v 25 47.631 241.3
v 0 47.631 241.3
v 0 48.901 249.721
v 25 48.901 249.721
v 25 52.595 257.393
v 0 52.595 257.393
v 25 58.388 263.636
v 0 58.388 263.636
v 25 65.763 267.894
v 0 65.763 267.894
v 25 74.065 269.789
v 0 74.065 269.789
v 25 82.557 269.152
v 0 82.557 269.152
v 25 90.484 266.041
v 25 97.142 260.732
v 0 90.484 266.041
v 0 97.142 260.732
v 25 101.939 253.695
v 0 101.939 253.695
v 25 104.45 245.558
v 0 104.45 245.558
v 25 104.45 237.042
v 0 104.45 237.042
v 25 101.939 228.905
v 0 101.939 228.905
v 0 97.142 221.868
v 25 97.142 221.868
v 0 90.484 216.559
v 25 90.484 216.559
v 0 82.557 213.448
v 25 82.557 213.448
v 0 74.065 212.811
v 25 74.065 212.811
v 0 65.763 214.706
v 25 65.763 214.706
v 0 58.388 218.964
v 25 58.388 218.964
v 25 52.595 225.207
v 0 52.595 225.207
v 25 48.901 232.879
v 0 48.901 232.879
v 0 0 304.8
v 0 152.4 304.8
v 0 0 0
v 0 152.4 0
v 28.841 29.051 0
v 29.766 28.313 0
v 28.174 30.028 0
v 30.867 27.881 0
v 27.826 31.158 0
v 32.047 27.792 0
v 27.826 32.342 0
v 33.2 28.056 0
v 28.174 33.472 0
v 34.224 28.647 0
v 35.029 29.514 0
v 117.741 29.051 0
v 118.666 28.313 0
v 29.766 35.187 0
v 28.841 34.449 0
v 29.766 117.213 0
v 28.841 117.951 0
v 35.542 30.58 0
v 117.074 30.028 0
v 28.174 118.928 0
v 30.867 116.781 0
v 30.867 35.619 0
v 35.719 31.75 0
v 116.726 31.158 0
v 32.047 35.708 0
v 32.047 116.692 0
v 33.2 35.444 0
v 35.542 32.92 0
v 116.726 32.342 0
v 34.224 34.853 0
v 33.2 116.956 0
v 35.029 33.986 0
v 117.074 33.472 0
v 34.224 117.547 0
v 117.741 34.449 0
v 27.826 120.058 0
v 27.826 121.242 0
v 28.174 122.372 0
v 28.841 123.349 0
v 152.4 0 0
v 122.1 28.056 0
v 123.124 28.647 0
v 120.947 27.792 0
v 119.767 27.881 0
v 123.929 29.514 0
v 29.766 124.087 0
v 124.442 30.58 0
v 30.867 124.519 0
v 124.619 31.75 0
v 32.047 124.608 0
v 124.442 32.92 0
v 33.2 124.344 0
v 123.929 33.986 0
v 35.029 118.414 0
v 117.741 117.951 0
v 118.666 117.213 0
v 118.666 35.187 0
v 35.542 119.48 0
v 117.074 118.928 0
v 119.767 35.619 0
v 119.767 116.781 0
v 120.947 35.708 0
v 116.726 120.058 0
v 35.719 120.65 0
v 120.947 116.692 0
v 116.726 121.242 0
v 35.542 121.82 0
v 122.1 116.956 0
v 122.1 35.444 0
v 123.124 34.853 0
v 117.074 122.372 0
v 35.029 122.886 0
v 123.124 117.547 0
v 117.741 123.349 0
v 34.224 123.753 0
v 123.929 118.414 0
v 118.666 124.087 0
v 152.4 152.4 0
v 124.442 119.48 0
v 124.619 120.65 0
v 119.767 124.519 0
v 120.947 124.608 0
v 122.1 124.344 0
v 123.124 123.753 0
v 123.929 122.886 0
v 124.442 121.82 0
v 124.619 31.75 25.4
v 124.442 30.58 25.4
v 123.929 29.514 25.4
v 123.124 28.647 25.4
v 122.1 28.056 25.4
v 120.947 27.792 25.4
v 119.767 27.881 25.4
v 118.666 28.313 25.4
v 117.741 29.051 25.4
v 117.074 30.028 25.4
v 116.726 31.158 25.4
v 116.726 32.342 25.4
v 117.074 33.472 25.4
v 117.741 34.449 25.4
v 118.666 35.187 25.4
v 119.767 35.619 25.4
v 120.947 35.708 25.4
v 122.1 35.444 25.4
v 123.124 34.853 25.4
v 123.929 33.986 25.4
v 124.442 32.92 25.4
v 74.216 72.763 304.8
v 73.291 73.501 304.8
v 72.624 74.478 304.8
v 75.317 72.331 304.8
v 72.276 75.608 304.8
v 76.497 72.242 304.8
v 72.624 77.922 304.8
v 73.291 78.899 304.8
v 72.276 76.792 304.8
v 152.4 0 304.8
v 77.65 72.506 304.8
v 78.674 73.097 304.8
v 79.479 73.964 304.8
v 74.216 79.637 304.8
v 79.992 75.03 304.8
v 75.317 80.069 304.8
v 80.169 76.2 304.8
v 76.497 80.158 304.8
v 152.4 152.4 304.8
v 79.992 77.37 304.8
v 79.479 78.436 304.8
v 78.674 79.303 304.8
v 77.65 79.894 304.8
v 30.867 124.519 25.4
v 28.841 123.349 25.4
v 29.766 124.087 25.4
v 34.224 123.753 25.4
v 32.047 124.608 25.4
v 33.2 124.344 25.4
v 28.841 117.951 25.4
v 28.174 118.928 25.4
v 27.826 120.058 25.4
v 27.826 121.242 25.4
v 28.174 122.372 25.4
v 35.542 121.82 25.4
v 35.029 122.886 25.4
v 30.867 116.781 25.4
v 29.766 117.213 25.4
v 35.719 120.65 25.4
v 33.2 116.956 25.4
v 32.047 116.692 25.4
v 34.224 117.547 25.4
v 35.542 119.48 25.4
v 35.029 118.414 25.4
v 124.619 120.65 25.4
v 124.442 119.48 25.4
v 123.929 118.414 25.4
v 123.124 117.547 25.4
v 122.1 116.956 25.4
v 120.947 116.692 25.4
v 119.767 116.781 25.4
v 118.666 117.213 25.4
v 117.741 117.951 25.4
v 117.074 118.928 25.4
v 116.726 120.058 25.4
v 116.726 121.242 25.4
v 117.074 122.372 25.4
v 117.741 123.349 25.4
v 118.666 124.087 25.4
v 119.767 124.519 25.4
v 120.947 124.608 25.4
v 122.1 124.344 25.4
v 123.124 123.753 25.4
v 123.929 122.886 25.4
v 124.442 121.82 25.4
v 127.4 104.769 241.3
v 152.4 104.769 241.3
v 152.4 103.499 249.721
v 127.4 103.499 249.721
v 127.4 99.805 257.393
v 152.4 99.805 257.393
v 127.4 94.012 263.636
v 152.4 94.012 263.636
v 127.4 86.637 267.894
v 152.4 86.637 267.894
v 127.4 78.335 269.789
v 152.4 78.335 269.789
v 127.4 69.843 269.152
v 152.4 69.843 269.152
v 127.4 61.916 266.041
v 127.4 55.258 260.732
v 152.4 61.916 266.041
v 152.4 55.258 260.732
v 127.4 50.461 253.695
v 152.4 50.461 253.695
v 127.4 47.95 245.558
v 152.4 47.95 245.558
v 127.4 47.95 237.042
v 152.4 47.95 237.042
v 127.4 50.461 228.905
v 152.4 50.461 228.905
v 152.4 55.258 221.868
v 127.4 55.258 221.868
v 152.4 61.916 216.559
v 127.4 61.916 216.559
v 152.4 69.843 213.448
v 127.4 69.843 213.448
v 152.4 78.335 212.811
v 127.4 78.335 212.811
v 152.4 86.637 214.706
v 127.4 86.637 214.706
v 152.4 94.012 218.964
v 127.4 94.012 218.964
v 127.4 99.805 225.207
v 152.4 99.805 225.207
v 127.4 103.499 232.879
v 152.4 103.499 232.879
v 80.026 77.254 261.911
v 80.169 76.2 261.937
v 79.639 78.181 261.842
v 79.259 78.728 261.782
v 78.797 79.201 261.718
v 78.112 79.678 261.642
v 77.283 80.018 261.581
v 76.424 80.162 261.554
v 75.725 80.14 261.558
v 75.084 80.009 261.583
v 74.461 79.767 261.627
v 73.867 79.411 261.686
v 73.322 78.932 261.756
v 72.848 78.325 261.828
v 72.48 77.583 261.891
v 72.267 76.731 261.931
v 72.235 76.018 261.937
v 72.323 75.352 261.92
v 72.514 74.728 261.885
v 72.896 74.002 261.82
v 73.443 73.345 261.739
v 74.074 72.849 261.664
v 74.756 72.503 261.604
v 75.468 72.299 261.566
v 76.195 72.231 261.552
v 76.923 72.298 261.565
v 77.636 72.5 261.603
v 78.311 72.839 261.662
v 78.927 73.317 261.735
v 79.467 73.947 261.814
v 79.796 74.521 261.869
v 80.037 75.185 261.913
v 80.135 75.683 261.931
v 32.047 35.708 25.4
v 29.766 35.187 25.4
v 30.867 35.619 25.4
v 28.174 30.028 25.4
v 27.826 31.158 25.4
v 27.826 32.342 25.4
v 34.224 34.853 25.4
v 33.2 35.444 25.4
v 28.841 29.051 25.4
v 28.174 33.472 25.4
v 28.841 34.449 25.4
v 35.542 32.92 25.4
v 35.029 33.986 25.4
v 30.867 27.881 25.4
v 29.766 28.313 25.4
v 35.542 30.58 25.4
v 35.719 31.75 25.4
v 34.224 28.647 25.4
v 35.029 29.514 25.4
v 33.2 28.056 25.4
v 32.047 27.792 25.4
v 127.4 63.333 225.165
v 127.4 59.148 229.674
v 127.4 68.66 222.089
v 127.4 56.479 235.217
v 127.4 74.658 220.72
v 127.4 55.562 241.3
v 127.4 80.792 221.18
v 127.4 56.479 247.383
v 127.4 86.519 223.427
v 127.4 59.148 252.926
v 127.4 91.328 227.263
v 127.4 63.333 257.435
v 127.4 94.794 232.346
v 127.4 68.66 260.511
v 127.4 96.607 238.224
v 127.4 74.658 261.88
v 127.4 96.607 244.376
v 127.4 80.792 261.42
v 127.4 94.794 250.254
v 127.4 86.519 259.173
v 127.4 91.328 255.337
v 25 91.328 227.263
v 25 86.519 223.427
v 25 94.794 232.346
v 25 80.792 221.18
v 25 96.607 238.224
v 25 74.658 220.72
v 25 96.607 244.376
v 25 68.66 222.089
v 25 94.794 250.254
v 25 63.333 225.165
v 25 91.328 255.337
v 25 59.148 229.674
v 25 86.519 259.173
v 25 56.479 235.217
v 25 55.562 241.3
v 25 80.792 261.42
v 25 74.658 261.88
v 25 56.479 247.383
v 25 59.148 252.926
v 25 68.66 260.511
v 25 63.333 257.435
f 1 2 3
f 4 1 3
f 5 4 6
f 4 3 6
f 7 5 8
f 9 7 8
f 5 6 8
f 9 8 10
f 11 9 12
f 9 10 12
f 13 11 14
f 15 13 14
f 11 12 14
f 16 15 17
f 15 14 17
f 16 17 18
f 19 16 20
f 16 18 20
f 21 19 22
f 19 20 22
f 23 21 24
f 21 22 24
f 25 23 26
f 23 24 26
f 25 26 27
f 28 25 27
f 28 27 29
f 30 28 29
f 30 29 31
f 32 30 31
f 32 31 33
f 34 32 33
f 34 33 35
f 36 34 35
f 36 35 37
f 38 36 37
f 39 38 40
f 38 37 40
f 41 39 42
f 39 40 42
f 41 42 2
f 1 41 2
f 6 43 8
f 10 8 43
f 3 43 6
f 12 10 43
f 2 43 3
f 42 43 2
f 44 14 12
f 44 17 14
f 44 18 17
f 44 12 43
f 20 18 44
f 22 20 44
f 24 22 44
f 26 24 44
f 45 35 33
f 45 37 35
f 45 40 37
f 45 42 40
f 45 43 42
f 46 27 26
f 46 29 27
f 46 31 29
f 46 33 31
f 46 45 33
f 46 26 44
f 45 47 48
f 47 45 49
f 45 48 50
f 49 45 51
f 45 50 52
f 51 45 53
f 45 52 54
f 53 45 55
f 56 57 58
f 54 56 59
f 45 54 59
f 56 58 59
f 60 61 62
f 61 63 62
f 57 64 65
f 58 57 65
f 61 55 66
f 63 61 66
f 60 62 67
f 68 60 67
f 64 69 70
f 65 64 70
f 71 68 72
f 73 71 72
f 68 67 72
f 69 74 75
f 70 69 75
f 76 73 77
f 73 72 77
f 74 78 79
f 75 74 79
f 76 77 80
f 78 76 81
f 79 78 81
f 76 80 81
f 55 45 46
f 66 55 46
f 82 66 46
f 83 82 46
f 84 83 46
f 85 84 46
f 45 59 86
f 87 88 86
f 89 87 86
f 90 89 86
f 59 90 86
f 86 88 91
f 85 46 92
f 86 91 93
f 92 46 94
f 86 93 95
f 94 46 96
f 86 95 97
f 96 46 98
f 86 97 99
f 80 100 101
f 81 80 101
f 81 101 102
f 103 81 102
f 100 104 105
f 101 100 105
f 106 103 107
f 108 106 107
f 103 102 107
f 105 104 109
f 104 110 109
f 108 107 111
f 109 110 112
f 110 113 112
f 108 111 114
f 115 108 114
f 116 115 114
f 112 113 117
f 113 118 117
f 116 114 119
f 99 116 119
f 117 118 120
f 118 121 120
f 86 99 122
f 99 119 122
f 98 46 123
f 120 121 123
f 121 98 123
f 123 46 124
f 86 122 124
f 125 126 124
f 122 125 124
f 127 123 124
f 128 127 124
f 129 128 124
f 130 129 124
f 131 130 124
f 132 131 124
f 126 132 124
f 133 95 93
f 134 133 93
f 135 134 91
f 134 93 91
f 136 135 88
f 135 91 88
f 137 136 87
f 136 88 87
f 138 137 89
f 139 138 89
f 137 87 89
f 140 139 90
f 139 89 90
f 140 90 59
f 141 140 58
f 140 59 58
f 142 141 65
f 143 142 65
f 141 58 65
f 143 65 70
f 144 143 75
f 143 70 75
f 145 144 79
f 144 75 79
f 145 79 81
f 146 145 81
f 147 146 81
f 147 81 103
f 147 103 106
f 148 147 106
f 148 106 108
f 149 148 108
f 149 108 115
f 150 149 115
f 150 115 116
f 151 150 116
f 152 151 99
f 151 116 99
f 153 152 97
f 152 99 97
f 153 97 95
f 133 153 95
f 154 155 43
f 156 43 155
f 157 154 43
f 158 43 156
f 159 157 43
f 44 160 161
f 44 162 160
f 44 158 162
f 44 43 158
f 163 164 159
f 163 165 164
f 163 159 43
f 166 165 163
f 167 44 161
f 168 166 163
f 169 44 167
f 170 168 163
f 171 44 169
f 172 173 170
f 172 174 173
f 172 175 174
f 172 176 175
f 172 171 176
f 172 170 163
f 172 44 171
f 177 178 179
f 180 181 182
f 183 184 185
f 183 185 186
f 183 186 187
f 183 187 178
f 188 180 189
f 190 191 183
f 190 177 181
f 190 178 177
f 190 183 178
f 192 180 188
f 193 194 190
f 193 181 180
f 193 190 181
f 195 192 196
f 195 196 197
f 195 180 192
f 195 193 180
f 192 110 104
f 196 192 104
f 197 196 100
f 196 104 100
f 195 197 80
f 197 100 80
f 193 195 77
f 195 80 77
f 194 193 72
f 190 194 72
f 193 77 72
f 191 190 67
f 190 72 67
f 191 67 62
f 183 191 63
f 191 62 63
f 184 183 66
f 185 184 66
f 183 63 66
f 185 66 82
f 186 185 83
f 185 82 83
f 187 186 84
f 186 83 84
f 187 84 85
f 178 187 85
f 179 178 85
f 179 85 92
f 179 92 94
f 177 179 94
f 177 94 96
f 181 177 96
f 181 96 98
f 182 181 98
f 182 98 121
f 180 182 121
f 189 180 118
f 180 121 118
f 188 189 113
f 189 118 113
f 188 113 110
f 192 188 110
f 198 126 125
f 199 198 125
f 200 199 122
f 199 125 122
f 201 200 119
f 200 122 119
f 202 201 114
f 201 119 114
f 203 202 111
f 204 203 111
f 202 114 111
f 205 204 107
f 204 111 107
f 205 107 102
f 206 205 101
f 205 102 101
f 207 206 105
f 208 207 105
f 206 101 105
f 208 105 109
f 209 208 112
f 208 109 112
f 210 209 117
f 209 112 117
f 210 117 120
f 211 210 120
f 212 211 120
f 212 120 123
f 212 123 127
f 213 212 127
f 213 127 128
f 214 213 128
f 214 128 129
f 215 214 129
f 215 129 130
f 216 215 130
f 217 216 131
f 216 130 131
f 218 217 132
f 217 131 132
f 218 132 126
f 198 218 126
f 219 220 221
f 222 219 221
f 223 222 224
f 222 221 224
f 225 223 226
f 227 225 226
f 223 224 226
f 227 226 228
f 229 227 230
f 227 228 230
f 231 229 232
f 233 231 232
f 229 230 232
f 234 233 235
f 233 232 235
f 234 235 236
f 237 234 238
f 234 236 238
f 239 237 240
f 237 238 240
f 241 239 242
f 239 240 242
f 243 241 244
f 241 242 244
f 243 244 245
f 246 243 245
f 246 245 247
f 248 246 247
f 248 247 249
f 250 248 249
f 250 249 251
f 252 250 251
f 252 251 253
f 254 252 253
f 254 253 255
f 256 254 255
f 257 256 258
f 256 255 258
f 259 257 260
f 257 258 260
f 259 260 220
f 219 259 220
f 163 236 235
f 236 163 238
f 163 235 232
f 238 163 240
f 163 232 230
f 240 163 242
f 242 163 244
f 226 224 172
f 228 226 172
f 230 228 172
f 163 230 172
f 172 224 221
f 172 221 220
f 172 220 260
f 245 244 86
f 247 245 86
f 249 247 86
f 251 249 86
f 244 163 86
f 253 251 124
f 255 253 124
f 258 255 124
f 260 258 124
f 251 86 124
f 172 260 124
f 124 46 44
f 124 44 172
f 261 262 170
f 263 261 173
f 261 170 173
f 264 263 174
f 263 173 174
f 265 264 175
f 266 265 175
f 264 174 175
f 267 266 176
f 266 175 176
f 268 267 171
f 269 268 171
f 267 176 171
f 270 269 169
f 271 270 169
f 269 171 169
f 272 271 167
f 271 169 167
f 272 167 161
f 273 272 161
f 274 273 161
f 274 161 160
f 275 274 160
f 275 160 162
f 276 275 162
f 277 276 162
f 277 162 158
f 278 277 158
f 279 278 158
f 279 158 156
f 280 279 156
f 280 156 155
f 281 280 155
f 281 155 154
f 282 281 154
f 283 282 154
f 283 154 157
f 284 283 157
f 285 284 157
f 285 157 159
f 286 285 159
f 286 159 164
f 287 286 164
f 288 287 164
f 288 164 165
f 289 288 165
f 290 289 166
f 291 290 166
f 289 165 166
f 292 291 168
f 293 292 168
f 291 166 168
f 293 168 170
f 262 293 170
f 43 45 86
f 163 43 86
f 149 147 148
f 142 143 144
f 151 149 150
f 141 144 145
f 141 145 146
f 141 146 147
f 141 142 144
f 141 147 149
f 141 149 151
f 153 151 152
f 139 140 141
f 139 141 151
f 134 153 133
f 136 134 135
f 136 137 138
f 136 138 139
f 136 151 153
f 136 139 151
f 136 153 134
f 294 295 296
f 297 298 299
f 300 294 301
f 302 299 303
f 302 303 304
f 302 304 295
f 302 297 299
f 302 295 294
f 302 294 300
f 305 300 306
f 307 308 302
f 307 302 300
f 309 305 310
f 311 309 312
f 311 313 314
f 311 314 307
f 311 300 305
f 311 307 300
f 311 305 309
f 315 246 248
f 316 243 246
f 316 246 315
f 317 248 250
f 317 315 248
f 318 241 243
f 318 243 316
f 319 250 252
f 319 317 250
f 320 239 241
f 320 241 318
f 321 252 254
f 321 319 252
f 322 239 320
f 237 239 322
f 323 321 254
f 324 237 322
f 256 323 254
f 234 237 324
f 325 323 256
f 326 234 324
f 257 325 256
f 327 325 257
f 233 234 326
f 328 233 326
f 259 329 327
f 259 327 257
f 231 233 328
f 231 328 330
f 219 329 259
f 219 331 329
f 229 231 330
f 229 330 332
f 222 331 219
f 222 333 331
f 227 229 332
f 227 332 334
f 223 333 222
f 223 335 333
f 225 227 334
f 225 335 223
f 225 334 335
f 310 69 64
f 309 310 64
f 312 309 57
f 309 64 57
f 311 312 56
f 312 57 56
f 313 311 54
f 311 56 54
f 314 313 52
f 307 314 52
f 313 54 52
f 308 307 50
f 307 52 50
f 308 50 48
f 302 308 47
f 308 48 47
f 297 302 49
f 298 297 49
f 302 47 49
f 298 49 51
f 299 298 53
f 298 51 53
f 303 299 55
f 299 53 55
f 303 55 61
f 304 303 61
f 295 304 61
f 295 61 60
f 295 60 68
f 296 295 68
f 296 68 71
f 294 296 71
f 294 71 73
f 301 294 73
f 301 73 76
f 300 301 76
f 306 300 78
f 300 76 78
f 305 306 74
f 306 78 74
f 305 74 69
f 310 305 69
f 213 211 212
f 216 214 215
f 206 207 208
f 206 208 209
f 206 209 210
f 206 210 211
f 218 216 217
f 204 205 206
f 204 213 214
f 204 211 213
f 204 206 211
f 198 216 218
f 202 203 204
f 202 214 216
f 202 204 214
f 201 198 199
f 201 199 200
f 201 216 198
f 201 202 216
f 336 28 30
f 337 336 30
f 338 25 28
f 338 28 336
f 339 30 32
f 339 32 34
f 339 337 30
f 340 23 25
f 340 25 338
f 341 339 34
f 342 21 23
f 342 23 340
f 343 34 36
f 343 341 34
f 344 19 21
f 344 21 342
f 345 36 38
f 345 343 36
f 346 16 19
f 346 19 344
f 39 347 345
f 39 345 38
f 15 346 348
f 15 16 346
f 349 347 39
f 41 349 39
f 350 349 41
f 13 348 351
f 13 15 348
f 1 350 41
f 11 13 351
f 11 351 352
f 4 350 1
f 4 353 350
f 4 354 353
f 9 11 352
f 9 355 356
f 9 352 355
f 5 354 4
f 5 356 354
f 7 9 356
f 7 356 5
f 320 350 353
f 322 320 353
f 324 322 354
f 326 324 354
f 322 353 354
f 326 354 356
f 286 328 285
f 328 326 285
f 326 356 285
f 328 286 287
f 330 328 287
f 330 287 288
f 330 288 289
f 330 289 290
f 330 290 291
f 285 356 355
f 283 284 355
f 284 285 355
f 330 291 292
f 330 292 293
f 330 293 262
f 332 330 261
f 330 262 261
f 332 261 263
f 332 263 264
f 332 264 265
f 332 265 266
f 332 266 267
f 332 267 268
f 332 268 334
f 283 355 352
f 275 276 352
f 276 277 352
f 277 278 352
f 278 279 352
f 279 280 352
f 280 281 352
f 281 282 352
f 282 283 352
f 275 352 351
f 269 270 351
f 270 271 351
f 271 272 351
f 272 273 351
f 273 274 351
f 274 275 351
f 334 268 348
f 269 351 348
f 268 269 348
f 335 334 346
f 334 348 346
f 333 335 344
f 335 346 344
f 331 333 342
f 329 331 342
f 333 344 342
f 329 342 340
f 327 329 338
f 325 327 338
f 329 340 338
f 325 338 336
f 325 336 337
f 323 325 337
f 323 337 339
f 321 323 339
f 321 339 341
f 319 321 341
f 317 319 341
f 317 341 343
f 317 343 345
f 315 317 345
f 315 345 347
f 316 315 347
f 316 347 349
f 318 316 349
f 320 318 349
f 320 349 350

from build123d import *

# Parameters (mm, degrees)
F0_W      = 152.4
F0_H      = 152.4
F1_DEPTH  = 304.8
F2_R      = 28.56865
F3_DEPTH  = 25
F4_R      = 28.56865
F5_DEPTH  = 25
F6_R      = 20.6375
F7_DEPTH  = 264.16
F8_R      = 3.96875
F9_DEPTH  = 25.4
F10_R     = 3.96875
F11_DEPTH = 48.26


with BuildPart() as f1:
    # F0 (on Top) → F1 (new body)
    with BuildSketch(Plane.XY):
        with Locations((76.2, 76.2)):
            Rectangle(F0_W, F0_H)
    extrude(amount=F1_DEPTH)

    # F2 (on face) → F3 (cut)
    with BuildSketch(Plane.YZ.offset(152.4)):
        with Locations((76.2, 241.3)):
            Circle(F2_R)
    extrude(amount=-F3_DEPTH, mode=Mode.SUBTRACT)

    # F4 (on face) → F5 (cut)
    with BuildSketch(Plane(origin=(0, 0, 0), x_dir=(0, -1, 0), z_dir=(-1, 0, 0))):
        with Locations((-76.2, 241.3)):
            Circle(F4_R)
    extrude(amount=-F5_DEPTH, mode=Mode.SUBTRACT)

    # F6 (on face) → F7 (cut)
    with BuildSketch(Plane(origin=(25, 0, 0), x_dir=(0, -1, 0), z_dir=(-1, 0, 0))):
        with Locations((-76.2, 241.3)):
            Circle(F6_R)
    extrude(amount=-F7_DEPTH, mode=Mode.SUBTRACT)

    # F8 (on face) → F9 (cut)
    with BuildSketch(Plane(origin=(0, 0, 0), x_dir=(1, 0, 0), z_dir=(0, 0, -1))):
        with Locations((31.75, -31.75)):
            Circle(F8_R)
        with Locations((120.65, -31.75)):
            Circle(F8_R)
        with Locations((120.65, -120.65)):
            Circle(F8_R)
        with Locations((31.75, -120.65)):
            Circle(F8_R)
    extrude(amount=-F9_DEPTH, mode=Mode.SUBTRACT)

    # F10 (on face) → F11 (cut)
    with BuildSketch(Plane.XY.offset(304.8)):
        with Locations((76.2, 76.2)):
            Circle(F10_R)
    extrude(amount=-F11_DEPTH, mode=Mode.SUBTRACT)


solid = f1.part
